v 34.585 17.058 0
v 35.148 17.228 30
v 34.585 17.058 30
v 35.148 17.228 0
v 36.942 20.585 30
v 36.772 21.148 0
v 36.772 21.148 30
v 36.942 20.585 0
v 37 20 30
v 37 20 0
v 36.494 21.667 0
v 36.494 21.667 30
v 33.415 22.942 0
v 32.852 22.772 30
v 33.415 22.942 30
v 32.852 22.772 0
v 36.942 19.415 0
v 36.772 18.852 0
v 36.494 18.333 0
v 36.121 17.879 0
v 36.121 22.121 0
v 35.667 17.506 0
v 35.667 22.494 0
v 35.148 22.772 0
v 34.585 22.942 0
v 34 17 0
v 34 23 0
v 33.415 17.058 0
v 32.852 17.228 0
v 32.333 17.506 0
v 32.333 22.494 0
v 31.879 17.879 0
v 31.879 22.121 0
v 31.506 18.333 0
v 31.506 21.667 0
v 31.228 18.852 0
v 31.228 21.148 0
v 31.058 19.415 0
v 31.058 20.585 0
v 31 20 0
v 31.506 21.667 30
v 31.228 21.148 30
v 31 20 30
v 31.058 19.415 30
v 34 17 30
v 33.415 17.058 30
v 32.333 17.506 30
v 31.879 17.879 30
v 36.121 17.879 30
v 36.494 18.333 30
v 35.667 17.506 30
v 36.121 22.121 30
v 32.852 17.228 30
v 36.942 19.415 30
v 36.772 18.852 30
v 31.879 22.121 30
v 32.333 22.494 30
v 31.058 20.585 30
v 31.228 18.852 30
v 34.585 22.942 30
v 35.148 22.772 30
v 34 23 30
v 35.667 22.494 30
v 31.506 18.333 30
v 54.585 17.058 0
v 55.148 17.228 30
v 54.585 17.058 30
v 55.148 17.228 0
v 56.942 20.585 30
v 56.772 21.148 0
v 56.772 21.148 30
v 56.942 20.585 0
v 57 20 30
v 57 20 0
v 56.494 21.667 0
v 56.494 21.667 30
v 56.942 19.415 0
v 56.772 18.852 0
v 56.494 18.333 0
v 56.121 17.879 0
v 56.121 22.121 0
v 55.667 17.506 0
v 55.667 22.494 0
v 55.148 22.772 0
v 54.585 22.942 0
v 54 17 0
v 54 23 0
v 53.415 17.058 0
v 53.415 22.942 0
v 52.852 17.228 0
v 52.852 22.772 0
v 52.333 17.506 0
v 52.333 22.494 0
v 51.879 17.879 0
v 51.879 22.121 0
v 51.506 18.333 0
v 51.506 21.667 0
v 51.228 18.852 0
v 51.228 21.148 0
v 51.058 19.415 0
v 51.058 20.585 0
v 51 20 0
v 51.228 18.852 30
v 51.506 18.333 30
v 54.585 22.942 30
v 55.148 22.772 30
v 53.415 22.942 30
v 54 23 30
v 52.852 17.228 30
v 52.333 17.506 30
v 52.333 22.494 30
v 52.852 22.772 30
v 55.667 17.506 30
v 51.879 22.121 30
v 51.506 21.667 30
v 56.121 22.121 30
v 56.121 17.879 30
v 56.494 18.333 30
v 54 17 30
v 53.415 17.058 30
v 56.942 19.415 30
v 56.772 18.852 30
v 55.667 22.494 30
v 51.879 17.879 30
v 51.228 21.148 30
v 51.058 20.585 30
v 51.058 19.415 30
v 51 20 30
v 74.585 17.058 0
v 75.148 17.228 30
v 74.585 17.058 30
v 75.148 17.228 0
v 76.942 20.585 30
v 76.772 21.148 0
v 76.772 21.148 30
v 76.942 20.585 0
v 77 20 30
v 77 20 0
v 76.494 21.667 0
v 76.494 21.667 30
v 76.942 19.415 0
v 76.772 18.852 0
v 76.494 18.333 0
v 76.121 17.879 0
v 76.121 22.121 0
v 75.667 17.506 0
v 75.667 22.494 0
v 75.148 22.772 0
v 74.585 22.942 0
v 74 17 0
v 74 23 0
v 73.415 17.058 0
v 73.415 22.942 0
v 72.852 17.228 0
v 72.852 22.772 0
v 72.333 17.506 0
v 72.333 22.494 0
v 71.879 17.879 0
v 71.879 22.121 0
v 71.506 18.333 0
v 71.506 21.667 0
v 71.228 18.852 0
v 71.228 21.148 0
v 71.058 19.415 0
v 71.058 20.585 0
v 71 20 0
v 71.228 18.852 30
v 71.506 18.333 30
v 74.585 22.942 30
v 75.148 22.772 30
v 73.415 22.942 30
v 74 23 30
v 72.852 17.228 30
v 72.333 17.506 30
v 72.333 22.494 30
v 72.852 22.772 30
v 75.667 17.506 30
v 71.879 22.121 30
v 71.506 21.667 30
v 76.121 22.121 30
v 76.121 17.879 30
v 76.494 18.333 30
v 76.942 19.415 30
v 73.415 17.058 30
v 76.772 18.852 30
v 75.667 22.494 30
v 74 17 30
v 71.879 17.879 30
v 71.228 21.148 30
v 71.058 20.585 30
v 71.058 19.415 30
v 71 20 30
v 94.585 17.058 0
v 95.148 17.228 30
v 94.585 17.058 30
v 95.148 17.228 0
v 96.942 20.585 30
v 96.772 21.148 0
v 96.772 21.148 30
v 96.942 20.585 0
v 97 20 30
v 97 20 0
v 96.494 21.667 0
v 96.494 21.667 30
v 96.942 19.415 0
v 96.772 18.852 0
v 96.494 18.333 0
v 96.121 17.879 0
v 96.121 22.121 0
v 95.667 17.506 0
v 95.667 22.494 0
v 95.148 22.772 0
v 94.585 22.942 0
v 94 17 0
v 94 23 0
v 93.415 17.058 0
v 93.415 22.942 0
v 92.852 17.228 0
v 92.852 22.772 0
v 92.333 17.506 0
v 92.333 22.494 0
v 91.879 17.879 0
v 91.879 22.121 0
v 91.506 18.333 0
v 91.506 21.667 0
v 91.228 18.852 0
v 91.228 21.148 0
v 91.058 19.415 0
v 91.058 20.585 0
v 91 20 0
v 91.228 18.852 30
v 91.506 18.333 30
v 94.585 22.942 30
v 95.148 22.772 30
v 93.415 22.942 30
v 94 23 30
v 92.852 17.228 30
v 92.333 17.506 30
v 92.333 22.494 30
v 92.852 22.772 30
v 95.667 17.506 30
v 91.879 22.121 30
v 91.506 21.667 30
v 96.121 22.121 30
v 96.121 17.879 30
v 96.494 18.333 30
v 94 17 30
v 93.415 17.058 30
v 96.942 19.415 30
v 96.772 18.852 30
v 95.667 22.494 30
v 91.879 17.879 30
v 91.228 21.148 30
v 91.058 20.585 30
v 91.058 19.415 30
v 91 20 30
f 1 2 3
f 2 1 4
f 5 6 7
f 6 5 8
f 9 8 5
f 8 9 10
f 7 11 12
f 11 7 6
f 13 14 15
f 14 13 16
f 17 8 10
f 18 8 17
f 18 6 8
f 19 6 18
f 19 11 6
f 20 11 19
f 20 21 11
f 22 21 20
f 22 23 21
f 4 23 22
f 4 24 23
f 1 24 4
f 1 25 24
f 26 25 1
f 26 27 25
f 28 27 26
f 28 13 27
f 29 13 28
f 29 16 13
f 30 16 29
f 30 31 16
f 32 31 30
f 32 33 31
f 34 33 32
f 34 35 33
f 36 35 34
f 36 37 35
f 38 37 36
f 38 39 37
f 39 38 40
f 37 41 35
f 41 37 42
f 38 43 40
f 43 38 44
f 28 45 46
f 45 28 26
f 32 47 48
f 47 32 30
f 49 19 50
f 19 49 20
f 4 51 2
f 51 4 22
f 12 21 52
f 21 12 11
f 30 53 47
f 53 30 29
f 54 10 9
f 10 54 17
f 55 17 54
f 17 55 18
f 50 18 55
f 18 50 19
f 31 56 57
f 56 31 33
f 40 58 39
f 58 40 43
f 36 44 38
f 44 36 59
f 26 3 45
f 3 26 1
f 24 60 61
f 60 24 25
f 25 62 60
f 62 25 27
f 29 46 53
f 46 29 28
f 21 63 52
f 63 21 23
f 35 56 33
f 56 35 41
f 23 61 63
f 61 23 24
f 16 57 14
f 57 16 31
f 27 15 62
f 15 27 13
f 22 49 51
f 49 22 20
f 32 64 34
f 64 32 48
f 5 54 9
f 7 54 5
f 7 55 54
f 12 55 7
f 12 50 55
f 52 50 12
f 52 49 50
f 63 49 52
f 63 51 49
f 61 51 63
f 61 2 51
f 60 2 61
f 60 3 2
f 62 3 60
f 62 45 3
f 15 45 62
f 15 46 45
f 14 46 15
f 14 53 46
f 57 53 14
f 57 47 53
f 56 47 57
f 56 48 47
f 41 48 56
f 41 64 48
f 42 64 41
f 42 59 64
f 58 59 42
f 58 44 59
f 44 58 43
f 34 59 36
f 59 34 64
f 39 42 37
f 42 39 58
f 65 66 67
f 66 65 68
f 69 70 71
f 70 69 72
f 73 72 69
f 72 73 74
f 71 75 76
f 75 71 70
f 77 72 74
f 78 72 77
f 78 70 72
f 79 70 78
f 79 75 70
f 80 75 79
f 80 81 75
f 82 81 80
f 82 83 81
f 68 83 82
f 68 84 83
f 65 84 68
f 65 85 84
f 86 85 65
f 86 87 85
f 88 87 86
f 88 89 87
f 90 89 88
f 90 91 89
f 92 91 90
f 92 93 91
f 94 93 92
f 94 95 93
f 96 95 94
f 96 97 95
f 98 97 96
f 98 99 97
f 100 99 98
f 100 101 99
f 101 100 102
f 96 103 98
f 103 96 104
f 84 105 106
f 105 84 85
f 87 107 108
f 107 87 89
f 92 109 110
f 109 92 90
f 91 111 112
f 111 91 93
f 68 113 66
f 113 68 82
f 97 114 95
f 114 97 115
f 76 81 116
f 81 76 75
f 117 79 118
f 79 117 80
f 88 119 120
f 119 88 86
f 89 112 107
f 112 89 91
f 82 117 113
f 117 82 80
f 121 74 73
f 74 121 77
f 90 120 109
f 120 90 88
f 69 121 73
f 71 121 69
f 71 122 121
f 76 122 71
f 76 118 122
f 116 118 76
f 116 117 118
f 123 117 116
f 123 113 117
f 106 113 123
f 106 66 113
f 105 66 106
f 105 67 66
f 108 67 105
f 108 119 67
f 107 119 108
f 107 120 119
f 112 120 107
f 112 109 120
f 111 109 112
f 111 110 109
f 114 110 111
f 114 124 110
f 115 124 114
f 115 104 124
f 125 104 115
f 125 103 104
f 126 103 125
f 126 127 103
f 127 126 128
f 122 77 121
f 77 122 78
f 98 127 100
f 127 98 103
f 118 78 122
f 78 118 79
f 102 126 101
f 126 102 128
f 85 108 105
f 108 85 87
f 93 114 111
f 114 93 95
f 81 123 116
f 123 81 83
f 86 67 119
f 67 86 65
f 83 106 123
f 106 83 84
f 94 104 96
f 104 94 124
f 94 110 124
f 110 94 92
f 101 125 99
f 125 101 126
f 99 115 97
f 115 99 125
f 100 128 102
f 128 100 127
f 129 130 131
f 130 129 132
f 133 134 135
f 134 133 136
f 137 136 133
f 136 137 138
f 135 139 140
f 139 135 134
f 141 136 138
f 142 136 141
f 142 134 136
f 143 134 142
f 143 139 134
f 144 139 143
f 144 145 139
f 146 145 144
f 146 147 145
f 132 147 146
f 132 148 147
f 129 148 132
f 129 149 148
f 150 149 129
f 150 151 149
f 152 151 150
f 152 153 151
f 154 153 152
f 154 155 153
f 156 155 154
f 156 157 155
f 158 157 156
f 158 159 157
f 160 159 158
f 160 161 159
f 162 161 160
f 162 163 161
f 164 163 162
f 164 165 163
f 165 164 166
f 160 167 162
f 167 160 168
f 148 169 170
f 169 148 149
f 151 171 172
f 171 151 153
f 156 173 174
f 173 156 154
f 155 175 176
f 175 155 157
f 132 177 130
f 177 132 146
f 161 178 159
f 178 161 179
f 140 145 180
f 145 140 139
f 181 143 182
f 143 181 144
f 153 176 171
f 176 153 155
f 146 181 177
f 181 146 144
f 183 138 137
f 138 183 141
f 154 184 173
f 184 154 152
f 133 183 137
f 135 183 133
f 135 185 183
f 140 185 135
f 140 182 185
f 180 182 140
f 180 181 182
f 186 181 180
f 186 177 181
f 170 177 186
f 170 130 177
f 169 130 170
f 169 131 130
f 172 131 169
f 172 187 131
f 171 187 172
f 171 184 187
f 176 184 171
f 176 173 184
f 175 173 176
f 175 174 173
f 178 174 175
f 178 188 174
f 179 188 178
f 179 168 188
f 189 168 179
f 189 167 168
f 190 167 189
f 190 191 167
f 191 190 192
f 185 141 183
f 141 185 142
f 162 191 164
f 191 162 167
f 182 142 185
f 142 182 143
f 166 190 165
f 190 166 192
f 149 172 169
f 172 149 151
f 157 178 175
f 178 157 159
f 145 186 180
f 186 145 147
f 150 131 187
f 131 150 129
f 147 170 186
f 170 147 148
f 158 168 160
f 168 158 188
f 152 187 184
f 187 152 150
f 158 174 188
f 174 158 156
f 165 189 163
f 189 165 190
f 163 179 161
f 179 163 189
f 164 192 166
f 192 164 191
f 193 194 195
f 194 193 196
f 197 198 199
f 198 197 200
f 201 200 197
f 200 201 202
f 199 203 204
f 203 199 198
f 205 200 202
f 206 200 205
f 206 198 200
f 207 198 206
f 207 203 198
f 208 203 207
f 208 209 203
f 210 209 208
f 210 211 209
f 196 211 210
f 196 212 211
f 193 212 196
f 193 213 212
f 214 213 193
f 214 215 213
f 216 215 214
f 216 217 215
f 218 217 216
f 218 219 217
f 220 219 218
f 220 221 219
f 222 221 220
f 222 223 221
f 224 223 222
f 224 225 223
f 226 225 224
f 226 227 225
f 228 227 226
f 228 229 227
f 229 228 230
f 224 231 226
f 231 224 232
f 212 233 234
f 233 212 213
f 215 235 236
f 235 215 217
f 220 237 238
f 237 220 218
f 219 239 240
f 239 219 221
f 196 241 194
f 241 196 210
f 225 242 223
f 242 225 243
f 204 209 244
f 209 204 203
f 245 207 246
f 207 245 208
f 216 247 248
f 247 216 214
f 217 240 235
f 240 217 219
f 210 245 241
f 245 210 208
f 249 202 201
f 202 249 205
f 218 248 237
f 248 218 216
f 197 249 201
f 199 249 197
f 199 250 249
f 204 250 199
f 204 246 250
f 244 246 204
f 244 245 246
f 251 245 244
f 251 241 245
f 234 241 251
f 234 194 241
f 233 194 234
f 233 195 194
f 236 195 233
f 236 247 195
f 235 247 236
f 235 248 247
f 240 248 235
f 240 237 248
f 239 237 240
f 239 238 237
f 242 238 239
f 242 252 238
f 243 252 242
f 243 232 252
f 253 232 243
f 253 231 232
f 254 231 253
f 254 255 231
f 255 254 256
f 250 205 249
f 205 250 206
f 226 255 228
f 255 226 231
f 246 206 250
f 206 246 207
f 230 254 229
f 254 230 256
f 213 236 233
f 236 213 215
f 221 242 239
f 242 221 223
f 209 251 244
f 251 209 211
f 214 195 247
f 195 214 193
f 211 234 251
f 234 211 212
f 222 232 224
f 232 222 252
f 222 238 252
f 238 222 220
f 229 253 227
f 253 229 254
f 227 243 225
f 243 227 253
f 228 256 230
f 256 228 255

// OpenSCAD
// Noctua NH-L12S Heatpipes
// 4x 6mm diameter copper heatpipes on one side of the heatsink

module nh_l12s_heatpipes() {
    pipe_diameter = 6;
    pipe_radius = pipe_diameter / 2;
    pipe_count = 4;
    pipe_height = 30;

    // Heatsink dimensions for reference
    heatsink_w = 128;
    heatsink_d = 146;

    // Pipes are positioned on front side (low Y), spread across width
    // Centered within the heatsink width
    pipe_spacing = 20;  // Space between pipe centers
    total_pipe_span = (pipe_count - 1) * pipe_spacing;
    start_x = (heatsink_w - total_pipe_span) / 2;

    // Y position - near front edge
    pipe_y = 20;  // Distance from front edge

    color([0.72, 0.45, 0.2]) {  // Copper color
        for (i = [0 : pipe_count - 1]) {
            translate([start_x + i * pipe_spacing, pipe_y, 0]) {
                cylinder(h = pipe_height, r = pipe_radius, $fn = 32);
            }
        }
    }
}

// Preview
nh_l12s_heatpipes();
